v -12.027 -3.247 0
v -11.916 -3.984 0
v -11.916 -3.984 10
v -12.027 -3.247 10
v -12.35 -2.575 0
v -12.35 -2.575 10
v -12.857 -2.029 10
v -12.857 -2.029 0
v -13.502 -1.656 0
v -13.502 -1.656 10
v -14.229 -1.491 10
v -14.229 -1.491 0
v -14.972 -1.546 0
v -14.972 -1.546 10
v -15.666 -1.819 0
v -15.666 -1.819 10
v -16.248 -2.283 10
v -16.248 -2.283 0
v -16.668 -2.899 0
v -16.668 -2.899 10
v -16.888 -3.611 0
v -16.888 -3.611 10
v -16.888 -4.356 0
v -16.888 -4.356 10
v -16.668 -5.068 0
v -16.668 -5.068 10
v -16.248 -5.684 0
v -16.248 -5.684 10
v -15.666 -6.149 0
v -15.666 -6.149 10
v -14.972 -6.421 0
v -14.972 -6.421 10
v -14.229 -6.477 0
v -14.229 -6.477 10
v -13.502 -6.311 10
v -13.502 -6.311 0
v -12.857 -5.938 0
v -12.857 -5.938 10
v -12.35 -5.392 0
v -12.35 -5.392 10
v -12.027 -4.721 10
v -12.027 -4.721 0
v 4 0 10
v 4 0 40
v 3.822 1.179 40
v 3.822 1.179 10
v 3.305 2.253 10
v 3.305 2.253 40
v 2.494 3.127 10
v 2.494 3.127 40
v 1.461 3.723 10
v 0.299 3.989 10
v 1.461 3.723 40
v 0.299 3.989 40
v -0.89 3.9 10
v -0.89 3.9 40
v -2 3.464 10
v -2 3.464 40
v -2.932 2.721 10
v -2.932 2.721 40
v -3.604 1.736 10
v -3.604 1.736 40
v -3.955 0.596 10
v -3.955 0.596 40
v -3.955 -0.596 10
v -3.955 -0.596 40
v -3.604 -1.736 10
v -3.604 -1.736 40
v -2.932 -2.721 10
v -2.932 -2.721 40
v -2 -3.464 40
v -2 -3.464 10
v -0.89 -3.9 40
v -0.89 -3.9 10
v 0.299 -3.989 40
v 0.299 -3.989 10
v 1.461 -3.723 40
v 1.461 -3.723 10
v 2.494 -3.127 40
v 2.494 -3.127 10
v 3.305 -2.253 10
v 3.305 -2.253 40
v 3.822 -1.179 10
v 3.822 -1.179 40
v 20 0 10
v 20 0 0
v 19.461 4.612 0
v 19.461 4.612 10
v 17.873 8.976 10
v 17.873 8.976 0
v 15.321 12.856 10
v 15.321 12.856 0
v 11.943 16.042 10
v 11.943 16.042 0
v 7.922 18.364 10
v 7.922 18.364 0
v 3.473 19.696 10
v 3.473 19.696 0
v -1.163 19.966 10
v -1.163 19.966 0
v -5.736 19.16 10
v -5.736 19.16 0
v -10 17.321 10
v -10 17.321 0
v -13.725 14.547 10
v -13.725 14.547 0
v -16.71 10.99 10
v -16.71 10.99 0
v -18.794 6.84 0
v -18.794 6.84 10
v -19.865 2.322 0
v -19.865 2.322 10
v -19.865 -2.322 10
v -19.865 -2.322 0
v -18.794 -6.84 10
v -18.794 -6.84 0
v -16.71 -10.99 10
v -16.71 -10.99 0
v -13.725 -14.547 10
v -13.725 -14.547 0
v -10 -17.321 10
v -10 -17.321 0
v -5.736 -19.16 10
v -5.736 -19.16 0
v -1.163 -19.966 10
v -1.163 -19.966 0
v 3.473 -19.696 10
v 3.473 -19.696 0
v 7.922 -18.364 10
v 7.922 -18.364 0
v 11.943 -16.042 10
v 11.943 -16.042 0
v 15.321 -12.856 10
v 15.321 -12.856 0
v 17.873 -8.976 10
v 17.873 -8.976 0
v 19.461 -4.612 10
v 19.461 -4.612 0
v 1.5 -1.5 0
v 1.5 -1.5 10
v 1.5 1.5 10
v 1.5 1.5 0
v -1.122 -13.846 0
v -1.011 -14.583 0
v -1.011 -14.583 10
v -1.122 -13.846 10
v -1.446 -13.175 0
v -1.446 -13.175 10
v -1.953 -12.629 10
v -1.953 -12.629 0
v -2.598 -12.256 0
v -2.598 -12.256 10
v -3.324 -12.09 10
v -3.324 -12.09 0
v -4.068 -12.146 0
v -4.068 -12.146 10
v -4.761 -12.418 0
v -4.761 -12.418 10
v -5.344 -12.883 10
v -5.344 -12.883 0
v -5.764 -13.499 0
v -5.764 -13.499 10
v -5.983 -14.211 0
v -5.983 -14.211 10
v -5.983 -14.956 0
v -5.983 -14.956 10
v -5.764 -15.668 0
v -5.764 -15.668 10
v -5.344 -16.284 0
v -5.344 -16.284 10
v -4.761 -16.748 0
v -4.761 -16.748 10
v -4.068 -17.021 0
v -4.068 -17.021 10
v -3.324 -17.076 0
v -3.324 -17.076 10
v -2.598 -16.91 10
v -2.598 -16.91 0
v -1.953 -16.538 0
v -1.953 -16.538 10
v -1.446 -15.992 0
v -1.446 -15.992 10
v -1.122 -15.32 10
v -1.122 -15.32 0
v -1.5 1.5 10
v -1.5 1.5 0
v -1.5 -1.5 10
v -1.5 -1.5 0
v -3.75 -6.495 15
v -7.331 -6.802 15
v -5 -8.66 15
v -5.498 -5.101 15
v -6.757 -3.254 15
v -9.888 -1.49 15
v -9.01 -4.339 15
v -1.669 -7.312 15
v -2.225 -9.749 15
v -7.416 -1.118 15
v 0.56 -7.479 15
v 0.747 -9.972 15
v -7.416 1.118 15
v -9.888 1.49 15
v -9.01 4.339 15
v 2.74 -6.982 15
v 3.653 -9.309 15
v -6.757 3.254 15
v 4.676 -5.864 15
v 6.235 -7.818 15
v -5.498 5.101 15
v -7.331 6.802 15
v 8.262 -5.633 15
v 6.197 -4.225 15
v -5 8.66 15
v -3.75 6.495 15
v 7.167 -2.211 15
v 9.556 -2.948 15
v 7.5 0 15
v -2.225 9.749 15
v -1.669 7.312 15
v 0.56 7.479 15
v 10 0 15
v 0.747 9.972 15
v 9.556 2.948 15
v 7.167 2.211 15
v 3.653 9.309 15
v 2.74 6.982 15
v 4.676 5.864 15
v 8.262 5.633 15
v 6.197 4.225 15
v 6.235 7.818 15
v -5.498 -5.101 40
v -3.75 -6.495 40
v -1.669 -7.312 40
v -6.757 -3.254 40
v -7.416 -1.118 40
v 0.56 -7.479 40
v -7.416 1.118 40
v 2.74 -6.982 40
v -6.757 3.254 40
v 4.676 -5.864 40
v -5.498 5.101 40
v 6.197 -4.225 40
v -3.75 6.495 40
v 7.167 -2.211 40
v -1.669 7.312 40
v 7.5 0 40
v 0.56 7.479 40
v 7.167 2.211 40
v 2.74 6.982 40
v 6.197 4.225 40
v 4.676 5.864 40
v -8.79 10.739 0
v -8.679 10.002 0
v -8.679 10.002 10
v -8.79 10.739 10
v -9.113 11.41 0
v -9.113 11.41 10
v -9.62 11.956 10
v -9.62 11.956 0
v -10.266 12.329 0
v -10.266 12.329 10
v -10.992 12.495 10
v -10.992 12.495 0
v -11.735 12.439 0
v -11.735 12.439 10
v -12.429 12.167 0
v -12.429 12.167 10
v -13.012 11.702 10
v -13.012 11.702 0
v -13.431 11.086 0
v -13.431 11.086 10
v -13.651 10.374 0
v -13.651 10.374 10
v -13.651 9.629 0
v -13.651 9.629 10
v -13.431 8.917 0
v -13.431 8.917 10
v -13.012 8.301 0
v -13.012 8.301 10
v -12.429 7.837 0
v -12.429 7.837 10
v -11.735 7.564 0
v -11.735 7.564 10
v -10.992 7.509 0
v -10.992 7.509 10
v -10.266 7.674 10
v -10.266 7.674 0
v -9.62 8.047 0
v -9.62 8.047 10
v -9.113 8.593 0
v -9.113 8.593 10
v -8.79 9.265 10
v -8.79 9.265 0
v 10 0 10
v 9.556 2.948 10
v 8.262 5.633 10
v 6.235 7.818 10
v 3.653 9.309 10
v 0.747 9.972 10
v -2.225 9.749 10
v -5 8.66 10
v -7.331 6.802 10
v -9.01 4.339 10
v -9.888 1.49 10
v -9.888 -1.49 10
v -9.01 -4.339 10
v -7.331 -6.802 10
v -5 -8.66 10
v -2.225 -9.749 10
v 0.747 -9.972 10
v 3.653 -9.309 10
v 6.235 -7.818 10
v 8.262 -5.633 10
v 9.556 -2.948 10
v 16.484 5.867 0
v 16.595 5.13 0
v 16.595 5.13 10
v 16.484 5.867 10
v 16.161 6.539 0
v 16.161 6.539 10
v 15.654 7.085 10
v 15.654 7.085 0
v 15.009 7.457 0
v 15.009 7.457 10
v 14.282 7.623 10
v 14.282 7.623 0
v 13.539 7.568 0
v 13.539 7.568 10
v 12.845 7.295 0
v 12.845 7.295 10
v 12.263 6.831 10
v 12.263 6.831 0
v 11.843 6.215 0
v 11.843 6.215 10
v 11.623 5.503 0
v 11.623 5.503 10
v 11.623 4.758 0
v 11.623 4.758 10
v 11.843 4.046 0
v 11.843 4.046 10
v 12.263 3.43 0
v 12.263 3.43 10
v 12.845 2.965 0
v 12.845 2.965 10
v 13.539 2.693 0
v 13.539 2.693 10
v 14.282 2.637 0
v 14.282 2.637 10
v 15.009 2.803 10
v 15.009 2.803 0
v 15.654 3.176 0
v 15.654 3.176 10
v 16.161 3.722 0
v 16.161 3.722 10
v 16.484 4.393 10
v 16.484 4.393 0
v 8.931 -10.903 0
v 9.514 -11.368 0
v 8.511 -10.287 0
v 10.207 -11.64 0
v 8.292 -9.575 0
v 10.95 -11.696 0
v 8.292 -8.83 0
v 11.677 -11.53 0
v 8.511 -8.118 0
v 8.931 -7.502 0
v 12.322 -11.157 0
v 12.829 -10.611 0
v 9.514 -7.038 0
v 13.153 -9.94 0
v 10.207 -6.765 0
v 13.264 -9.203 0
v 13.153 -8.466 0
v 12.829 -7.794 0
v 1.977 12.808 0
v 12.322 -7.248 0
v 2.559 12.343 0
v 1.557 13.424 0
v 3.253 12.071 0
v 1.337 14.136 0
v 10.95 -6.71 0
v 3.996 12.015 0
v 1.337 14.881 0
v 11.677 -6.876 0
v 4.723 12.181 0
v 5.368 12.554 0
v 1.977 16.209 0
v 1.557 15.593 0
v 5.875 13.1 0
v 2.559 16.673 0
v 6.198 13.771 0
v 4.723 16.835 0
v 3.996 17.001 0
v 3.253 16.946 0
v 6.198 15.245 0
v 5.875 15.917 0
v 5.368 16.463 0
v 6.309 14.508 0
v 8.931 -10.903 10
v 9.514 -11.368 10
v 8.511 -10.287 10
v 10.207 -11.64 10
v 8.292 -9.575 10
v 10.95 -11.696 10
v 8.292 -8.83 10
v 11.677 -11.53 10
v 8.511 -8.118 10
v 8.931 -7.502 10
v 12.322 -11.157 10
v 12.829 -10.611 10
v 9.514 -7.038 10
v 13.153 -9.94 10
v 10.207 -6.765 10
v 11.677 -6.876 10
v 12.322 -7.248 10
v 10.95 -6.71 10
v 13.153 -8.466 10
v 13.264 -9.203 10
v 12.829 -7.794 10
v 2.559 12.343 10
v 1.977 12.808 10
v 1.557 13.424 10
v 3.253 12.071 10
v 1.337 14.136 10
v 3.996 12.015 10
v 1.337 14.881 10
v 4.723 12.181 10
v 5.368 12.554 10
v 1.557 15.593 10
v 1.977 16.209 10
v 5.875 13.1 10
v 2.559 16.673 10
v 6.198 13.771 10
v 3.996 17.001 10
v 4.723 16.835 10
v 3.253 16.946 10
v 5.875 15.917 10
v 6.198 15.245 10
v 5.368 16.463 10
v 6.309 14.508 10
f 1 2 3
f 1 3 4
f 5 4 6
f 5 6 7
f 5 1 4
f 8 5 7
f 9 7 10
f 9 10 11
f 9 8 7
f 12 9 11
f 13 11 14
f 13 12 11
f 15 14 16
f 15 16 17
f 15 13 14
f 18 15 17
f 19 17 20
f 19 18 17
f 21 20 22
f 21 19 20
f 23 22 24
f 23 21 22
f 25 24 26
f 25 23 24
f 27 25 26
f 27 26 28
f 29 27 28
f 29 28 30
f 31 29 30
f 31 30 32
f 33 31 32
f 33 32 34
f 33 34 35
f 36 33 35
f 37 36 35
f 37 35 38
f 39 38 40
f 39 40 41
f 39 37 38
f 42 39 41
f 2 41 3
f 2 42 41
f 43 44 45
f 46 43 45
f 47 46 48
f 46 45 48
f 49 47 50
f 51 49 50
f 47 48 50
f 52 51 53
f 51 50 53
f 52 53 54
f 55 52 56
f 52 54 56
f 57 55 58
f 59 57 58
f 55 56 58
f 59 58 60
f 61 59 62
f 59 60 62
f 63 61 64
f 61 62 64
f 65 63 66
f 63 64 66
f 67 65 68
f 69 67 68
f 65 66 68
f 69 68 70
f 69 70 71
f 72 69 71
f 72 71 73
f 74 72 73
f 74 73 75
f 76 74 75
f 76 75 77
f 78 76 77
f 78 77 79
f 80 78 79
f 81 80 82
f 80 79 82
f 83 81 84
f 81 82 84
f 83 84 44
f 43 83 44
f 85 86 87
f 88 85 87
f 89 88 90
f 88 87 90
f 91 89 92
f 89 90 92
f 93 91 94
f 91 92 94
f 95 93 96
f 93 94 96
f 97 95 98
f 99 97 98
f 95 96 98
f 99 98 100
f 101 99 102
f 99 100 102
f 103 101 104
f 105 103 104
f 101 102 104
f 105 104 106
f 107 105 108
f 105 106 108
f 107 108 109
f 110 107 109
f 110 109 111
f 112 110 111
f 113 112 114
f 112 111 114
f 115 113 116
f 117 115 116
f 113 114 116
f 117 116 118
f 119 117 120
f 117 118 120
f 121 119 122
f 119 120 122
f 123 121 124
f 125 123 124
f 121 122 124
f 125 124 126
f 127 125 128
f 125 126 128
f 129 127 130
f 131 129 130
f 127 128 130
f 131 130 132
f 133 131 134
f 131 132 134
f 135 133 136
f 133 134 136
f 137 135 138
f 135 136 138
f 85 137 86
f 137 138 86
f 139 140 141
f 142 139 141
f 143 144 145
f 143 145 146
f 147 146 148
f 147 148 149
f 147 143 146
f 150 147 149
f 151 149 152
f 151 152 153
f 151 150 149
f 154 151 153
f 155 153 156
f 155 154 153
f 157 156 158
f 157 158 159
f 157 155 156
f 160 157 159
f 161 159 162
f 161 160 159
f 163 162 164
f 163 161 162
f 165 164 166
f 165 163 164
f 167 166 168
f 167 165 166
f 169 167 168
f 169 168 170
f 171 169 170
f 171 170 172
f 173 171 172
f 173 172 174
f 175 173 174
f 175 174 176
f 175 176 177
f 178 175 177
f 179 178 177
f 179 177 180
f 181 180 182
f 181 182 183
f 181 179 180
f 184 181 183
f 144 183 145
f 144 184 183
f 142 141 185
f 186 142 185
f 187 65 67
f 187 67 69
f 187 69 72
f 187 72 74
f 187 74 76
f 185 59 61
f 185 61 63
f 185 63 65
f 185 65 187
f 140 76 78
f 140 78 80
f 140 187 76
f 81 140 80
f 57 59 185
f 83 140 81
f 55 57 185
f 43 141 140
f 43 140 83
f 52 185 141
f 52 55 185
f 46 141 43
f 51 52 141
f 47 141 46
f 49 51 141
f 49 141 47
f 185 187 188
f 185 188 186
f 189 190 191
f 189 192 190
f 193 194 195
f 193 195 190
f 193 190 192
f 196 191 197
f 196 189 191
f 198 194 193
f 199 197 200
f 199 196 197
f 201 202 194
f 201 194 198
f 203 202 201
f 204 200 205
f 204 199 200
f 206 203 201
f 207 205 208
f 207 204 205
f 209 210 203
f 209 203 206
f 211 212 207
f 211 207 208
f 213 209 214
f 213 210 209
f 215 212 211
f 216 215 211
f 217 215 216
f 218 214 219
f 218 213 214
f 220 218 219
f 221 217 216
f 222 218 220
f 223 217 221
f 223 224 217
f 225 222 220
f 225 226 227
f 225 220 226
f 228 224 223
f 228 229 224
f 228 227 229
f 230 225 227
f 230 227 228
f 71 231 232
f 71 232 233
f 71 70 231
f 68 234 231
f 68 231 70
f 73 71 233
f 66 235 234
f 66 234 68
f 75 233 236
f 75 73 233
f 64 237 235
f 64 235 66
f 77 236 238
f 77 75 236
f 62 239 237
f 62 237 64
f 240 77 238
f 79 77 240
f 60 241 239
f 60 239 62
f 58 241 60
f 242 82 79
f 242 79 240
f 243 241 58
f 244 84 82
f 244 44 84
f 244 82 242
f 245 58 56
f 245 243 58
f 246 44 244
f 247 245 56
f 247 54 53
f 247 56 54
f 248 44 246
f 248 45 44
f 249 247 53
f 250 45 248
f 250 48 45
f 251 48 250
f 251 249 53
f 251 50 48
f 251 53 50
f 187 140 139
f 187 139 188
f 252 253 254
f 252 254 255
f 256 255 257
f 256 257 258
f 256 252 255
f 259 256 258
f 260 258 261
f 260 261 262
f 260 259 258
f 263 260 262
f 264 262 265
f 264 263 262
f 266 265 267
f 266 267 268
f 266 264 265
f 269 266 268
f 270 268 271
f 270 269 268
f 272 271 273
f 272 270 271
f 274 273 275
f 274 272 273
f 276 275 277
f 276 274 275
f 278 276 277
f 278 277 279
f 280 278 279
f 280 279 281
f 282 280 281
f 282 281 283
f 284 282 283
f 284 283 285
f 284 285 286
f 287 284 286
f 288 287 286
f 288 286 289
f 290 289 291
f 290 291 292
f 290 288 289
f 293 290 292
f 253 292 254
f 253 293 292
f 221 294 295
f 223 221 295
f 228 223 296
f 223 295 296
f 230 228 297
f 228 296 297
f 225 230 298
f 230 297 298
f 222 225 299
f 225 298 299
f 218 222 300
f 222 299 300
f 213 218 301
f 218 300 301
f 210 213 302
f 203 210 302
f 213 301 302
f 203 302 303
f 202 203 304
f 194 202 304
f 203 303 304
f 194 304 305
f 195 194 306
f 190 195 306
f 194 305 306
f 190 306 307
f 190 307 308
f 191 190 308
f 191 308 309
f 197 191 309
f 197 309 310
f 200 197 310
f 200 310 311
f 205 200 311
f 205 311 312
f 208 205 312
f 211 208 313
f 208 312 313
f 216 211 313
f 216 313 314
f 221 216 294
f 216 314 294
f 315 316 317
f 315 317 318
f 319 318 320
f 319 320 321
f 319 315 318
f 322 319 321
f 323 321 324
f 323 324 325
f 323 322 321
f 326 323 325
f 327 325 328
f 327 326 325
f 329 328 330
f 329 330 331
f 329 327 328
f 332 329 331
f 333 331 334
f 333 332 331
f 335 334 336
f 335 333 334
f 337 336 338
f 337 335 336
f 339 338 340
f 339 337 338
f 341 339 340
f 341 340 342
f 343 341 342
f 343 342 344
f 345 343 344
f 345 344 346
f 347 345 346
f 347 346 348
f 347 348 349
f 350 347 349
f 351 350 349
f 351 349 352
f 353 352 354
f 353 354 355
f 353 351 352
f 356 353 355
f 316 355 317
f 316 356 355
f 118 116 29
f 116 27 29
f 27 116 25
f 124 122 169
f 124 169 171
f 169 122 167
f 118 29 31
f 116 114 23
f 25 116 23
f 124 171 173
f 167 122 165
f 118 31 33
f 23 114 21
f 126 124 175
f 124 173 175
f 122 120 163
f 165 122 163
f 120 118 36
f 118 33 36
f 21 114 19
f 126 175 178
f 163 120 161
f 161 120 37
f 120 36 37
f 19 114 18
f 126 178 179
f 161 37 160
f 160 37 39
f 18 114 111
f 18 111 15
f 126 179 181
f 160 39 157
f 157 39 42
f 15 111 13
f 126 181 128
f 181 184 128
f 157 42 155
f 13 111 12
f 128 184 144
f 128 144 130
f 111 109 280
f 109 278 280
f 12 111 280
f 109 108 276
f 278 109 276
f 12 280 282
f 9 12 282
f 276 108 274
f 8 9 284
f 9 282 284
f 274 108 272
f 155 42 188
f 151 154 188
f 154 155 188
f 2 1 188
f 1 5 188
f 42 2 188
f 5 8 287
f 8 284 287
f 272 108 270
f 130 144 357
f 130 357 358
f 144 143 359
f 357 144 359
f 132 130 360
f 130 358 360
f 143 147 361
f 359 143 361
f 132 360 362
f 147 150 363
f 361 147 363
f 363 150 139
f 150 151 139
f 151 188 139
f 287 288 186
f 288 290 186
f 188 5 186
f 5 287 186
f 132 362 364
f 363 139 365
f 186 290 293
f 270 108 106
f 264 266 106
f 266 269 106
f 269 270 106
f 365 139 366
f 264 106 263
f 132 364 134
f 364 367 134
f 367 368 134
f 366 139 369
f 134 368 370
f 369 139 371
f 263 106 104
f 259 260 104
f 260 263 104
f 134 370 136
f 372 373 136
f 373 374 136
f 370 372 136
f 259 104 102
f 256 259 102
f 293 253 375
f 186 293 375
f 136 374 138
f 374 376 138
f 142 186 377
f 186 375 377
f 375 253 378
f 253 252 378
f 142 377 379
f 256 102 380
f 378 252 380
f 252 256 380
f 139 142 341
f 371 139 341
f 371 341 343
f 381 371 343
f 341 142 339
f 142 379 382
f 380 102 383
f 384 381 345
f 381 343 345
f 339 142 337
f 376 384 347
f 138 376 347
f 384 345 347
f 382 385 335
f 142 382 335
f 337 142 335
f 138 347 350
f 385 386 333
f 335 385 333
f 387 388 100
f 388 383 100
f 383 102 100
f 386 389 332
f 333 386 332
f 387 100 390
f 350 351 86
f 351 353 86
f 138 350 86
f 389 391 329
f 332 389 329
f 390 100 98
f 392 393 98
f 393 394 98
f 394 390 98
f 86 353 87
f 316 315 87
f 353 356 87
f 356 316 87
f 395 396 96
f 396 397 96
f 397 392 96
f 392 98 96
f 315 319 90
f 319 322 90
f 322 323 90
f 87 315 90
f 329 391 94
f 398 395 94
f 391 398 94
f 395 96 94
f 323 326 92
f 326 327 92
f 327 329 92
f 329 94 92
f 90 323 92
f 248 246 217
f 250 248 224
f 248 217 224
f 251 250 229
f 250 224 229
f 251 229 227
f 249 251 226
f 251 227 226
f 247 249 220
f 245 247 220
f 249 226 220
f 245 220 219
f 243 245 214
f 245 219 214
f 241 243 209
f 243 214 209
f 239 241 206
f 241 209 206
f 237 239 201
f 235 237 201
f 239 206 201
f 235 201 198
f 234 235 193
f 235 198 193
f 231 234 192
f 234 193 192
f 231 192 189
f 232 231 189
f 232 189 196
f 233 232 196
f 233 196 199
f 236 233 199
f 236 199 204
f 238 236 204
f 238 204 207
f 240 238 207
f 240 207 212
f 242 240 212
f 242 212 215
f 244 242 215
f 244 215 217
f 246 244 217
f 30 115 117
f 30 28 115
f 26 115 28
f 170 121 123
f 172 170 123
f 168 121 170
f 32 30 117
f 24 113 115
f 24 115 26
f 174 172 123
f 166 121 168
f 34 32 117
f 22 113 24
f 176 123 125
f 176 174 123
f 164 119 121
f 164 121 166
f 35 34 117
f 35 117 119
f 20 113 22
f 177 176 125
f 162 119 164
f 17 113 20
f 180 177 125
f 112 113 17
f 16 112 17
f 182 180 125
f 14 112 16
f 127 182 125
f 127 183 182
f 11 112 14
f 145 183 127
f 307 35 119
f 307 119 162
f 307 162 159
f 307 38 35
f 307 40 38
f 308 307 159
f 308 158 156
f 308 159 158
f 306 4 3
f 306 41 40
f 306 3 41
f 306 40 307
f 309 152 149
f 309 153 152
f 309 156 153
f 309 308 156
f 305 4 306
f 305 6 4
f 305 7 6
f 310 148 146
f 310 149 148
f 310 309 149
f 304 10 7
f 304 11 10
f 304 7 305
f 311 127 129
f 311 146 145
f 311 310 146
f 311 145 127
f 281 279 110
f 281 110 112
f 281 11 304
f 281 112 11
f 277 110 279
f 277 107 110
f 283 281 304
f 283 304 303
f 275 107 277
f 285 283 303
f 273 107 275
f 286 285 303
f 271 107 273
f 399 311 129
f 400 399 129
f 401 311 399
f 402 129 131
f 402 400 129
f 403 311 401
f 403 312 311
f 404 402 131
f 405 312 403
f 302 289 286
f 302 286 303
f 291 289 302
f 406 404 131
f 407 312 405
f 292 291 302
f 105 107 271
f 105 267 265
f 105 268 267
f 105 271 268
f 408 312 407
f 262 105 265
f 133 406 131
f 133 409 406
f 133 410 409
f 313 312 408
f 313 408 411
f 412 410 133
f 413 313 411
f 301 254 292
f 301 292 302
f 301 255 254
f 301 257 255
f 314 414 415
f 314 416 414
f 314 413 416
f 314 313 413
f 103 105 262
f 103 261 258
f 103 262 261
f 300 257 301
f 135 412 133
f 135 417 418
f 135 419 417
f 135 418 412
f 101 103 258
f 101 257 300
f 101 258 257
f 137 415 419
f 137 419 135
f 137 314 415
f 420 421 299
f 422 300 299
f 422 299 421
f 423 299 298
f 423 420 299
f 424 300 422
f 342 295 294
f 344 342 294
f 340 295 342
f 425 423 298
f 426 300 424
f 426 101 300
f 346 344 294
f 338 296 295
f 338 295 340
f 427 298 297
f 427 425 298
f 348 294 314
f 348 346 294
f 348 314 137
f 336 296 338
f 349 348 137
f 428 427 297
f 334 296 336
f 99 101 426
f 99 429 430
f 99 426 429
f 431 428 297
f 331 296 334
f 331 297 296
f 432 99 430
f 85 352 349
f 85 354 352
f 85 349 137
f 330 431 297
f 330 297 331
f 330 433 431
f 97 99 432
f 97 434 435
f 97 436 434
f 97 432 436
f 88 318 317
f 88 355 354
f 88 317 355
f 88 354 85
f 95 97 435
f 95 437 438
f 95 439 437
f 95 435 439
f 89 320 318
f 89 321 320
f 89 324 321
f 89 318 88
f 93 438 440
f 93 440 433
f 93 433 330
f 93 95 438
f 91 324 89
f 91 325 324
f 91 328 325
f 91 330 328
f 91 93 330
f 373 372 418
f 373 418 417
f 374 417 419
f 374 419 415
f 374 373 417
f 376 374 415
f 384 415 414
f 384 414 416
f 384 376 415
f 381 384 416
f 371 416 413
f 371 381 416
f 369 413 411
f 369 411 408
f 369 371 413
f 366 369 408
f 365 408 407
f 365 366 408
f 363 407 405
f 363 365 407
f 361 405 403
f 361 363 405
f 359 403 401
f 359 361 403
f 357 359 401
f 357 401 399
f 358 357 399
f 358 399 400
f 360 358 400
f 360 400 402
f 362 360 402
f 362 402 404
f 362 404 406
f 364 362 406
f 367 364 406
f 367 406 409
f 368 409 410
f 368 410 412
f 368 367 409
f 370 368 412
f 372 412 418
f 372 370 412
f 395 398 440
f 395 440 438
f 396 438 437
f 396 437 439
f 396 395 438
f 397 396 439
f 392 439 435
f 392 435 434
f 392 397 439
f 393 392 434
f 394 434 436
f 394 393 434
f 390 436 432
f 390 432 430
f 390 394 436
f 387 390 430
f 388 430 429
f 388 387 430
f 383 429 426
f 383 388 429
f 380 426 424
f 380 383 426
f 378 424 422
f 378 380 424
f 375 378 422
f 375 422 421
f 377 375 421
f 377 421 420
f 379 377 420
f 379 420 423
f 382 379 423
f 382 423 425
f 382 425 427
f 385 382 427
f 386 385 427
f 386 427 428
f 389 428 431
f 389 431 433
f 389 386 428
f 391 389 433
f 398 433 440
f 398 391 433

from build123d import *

# Parameters (mm, degrees)
SKETCH1_R           = 20
SKETCH1_R_2         = 2.5
BOSS_EXTRUDE1_DEPTH = 10
SKETCH2_R           = 7.5
BOSS_EXTRUDE2_DEPTH = 30
SKETCH3_R           = 4
CUT_EXTRUDE1_DEPTH  = 30
SKETCH4_W           = 3
SKETCH4_H           = 3
CUT_EXTRUDE2_DEPTH  = 20
SKETCH5_R           = 10
SKETCH5_R_2         = 7.5
BOSS_EXTRUDE3_DEPTH = 5


with BuildPart() as part:
    # Sketch1 → Boss-Extrude1 (new body)
    with BuildSketch(Plane.XY):
        Circle(SKETCH1_R)
        with Locations((3.80920927, 14.508270908)):
            Circle(SKETCH1_R_2, mode=Mode.SUBTRACT)
        with Locations((14.095417524, 5.130224636)):
            Circle(SKETCH1_R_2, mode=Mode.SUBTRACT)
        with Locations((10.763605071, -9.202774002)):
            Circle(SKETCH1_R_2, mode=Mode.SUBTRACT)
        with Locations((-3.511280661, -14.583240659)):
            Circle(SKETCH1_R_2, mode=Mode.SUBTRACT)
        with Locations((-14.415788075, -3.983677546)):
            Circle(SKETCH1_R_2, mode=Mode.SUBTRACT)
        with Locations((-11.178876863, 10.00163547)):
            Circle(SKETCH1_R_2, mode=Mode.SUBTRACT)
    extrude(amount=BOSS_EXTRUDE1_DEPTH)

    # Sketch2 → Boss-Extrude2 (add)
    with BuildSketch(Plane.XY.offset(10)):
        Circle(SKETCH2_R)
    extrude(amount=BOSS_EXTRUDE2_DEPTH)

    # Sketch3 → Cut-Extrude1 (cut)
    with BuildSketch(Plane.XY.offset(40)):
        Circle(SKETCH3_R)
    extrude(amount=-CUT_EXTRUDE1_DEPTH, mode=Mode.SUBTRACT)

    # Sketch4 → Cut-Extrude2 (cut)
    with BuildSketch(Plane(origin=(0, 0, 0), x_dir=(-1, 0, 0), z_dir=(0, 0, -1))):
        Rectangle(SKETCH4_W, SKETCH4_H)
    extrude(amount=-CUT_EXTRUDE2_DEPTH, mode=Mode.SUBTRACT)

    # Sketch5 → Boss-Extrude3 (add)
    with BuildSketch(Plane.XY.offset(10)):
        Circle(SKETCH5_R)
        Circle(SKETCH5_R_2, mode=Mode.SUBTRACT)
    extrude(amount=BOSS_EXTRUDE3_DEPTH)


solid = part.part
